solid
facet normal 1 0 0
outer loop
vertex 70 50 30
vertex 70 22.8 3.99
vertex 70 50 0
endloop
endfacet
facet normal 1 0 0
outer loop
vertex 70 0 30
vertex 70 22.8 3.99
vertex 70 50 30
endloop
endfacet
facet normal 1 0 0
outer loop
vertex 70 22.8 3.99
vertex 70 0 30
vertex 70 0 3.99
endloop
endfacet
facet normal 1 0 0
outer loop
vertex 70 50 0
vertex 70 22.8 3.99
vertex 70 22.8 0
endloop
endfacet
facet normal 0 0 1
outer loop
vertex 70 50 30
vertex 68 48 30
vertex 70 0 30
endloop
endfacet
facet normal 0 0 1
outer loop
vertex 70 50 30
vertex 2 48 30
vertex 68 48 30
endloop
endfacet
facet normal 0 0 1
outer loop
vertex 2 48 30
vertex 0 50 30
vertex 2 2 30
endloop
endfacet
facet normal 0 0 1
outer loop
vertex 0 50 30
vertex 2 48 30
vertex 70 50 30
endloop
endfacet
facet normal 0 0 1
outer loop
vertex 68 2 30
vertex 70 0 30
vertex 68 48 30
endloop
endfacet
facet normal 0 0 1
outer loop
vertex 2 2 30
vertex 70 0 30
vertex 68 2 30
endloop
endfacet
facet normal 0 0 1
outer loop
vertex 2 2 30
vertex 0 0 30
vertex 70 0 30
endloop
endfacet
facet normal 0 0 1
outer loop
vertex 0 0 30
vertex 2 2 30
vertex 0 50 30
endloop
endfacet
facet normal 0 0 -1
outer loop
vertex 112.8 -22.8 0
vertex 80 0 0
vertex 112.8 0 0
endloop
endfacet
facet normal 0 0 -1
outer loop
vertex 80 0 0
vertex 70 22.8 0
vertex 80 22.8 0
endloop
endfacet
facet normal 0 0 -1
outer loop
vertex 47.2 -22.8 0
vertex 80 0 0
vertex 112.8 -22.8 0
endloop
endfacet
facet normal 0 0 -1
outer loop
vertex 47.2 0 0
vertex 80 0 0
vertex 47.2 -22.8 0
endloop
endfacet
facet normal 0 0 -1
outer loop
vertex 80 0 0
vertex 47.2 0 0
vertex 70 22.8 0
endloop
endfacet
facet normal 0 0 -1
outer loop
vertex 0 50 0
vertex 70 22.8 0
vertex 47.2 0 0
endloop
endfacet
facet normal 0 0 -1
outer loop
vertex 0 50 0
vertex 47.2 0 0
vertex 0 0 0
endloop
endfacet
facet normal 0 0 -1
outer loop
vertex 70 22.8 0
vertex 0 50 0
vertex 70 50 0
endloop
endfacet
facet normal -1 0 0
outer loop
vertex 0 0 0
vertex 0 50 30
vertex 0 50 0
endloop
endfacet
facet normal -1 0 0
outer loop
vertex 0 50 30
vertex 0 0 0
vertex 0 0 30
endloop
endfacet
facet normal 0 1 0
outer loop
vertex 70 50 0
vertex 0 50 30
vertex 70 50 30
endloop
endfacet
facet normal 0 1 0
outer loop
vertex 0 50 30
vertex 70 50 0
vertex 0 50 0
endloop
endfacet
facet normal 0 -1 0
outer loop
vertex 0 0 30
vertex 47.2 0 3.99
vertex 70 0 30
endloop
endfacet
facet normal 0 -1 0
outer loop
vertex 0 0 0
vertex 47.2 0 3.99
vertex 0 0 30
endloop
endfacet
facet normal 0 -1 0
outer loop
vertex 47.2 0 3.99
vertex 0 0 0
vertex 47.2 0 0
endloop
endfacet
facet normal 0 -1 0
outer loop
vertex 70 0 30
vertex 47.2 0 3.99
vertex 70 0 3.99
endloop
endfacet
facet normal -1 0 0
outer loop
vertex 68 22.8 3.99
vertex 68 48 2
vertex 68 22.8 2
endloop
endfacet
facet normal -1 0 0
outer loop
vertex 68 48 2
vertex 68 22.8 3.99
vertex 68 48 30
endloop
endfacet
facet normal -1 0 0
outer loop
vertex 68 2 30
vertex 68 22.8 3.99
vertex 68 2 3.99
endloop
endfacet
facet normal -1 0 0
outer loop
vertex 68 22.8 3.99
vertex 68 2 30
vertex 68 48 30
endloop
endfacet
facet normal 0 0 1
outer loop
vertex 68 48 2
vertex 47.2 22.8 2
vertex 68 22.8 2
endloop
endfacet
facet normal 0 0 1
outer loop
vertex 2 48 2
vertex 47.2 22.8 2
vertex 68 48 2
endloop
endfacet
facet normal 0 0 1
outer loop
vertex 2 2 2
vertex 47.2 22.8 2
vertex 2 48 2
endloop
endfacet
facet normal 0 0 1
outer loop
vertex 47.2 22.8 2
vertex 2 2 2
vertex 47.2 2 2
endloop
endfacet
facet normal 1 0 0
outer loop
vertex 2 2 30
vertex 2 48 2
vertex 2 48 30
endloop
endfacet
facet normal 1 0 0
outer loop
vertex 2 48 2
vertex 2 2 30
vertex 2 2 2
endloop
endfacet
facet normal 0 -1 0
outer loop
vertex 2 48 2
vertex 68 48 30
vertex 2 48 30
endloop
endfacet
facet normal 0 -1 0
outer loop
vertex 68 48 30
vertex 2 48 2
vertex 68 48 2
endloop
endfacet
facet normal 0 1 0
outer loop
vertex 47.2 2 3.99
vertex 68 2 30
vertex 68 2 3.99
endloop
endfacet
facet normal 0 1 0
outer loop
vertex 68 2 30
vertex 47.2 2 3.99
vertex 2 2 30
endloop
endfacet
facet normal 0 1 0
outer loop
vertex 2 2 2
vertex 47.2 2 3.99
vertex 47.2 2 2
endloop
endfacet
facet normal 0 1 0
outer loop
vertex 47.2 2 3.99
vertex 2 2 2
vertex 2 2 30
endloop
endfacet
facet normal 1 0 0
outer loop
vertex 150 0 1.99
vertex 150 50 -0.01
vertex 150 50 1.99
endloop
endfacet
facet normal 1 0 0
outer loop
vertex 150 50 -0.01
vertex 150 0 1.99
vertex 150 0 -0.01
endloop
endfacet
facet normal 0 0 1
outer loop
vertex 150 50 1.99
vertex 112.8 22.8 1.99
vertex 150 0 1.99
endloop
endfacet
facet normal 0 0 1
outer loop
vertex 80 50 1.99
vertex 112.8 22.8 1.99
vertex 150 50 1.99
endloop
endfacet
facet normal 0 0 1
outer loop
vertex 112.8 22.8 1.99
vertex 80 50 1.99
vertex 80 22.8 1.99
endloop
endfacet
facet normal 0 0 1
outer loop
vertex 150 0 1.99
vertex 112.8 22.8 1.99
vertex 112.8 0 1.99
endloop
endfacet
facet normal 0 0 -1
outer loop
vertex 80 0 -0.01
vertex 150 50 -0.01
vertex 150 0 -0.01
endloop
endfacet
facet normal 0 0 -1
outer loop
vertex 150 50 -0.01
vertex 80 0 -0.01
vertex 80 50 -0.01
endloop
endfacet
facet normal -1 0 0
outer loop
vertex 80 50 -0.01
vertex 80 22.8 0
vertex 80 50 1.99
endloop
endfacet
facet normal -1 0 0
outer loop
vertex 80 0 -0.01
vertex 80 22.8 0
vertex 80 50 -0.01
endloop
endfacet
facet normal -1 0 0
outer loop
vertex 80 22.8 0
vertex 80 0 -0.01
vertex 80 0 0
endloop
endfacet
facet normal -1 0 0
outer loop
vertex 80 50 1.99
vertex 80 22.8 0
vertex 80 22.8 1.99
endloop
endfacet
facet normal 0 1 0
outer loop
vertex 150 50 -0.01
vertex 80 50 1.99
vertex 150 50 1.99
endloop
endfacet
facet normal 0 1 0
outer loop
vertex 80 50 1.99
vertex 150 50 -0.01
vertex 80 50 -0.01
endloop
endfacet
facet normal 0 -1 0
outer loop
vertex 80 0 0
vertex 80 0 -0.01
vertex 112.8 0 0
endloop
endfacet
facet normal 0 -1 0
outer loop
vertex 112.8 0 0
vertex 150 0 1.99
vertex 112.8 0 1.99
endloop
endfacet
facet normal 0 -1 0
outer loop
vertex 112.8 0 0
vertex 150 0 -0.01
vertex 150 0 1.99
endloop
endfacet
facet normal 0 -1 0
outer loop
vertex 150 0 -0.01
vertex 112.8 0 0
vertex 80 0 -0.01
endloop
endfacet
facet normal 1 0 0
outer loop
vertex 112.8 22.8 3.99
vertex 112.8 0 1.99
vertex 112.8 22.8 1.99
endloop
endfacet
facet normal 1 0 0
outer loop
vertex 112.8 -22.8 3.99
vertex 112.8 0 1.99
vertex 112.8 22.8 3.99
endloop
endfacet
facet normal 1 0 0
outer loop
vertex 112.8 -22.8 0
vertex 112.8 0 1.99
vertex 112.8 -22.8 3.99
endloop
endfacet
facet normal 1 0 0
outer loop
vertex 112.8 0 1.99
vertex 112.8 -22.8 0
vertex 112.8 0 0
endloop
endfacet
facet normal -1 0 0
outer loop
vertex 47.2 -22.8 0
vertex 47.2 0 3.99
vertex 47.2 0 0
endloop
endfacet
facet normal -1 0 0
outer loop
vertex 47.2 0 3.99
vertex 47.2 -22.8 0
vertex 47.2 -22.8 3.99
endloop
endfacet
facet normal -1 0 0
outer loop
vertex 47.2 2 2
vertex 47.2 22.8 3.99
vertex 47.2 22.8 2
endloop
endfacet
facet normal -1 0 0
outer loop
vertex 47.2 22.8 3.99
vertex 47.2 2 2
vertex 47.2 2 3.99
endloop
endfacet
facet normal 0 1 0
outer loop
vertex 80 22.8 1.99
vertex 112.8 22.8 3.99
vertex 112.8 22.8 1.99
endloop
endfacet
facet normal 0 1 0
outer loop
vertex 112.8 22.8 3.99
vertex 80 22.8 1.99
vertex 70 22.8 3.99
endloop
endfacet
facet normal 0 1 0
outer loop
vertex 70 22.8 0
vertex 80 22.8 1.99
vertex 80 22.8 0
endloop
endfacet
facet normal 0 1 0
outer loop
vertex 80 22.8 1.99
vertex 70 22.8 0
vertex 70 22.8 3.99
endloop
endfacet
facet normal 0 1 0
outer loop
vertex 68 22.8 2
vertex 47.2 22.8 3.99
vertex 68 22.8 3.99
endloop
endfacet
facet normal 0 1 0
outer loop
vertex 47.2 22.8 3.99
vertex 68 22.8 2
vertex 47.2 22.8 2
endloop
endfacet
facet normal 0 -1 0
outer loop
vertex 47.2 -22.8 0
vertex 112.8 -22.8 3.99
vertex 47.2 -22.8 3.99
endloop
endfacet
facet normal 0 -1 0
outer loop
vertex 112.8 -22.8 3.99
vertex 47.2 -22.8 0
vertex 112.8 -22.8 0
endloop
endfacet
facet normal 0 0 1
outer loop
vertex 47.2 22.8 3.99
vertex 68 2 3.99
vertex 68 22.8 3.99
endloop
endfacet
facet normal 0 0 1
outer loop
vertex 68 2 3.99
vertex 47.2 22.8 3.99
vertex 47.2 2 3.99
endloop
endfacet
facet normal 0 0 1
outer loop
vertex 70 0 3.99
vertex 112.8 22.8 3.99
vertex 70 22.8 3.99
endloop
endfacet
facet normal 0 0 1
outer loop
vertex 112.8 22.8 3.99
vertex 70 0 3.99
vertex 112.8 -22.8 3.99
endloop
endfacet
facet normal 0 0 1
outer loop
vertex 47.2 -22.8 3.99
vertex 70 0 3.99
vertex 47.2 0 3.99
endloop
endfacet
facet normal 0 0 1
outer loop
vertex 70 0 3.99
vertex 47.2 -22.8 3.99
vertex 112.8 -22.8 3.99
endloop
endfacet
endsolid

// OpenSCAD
// Two-part enclosure for small electronics board
// Print orientation: box standing on bed (z = 0), lid on top, printed upside down

// ---------------- Parameters ----------------
box_x      = 70;    // box outer length (X)
box_y      = 50;    // box outer width (Y)
box_z      = 30;    // box outer height (Z)
box_wall   = 2;     // box wall thickness
box_floor  = 2;     // box floor thickness

gap        = 10;    // gap between box and lid

lip_wall   = 1.5;   // lid lip wall thickness
lip_h      = 4;     // lid lip height
lip_x      = 65.6;  // lid lip outer length (X)
lip_y      = 45.6;  // lid lip outer width (Y)

eps        = 0.5;   // cutter overshoot past faces

$fn = 64;

// ---------------- Derived ----------------
box_inner_x = box_x - 2 * box_wall;
box_inner_y = box_y - 2 * box_wall;
box_inner_z = box_z - box_floor;   // open-top cavity height

// ---------------- Model ----------------
union() {
    // Part 1: box, open top
    difference() {
        cube([box_x, box_y, box_z]);
        translate([box_wall, box_wall, box_floor])
            cube([box_inner_x, box_inner_y, box_inner_z + 0.01]); // tiny floor
    }

    // Part 2: lid plate with lip, printed upside down
    translate([box_x + gap, 0, 0]) {
        difference() {
            union() {
                // base plate
                translate([0, 0, -0.01])
                    cube([box_x, box_y, 2]);
                // lip (overhangs plate, slides into box opening)
                translate([-lip_x / 2, -lip_y / 2, 0])
                    cube([lip_x, lip_y, lip_h]);
            }
            // cutter for clean lip top and for the 0.2 mm clearance
            translate([-lip_x / 2 - eps, -lip_y / 2 - eps, lip_h - 0.01])
                cube([lip_x + 2 * eps, lip_y + 2 * eps, 0.02]);
        }
    }
}
